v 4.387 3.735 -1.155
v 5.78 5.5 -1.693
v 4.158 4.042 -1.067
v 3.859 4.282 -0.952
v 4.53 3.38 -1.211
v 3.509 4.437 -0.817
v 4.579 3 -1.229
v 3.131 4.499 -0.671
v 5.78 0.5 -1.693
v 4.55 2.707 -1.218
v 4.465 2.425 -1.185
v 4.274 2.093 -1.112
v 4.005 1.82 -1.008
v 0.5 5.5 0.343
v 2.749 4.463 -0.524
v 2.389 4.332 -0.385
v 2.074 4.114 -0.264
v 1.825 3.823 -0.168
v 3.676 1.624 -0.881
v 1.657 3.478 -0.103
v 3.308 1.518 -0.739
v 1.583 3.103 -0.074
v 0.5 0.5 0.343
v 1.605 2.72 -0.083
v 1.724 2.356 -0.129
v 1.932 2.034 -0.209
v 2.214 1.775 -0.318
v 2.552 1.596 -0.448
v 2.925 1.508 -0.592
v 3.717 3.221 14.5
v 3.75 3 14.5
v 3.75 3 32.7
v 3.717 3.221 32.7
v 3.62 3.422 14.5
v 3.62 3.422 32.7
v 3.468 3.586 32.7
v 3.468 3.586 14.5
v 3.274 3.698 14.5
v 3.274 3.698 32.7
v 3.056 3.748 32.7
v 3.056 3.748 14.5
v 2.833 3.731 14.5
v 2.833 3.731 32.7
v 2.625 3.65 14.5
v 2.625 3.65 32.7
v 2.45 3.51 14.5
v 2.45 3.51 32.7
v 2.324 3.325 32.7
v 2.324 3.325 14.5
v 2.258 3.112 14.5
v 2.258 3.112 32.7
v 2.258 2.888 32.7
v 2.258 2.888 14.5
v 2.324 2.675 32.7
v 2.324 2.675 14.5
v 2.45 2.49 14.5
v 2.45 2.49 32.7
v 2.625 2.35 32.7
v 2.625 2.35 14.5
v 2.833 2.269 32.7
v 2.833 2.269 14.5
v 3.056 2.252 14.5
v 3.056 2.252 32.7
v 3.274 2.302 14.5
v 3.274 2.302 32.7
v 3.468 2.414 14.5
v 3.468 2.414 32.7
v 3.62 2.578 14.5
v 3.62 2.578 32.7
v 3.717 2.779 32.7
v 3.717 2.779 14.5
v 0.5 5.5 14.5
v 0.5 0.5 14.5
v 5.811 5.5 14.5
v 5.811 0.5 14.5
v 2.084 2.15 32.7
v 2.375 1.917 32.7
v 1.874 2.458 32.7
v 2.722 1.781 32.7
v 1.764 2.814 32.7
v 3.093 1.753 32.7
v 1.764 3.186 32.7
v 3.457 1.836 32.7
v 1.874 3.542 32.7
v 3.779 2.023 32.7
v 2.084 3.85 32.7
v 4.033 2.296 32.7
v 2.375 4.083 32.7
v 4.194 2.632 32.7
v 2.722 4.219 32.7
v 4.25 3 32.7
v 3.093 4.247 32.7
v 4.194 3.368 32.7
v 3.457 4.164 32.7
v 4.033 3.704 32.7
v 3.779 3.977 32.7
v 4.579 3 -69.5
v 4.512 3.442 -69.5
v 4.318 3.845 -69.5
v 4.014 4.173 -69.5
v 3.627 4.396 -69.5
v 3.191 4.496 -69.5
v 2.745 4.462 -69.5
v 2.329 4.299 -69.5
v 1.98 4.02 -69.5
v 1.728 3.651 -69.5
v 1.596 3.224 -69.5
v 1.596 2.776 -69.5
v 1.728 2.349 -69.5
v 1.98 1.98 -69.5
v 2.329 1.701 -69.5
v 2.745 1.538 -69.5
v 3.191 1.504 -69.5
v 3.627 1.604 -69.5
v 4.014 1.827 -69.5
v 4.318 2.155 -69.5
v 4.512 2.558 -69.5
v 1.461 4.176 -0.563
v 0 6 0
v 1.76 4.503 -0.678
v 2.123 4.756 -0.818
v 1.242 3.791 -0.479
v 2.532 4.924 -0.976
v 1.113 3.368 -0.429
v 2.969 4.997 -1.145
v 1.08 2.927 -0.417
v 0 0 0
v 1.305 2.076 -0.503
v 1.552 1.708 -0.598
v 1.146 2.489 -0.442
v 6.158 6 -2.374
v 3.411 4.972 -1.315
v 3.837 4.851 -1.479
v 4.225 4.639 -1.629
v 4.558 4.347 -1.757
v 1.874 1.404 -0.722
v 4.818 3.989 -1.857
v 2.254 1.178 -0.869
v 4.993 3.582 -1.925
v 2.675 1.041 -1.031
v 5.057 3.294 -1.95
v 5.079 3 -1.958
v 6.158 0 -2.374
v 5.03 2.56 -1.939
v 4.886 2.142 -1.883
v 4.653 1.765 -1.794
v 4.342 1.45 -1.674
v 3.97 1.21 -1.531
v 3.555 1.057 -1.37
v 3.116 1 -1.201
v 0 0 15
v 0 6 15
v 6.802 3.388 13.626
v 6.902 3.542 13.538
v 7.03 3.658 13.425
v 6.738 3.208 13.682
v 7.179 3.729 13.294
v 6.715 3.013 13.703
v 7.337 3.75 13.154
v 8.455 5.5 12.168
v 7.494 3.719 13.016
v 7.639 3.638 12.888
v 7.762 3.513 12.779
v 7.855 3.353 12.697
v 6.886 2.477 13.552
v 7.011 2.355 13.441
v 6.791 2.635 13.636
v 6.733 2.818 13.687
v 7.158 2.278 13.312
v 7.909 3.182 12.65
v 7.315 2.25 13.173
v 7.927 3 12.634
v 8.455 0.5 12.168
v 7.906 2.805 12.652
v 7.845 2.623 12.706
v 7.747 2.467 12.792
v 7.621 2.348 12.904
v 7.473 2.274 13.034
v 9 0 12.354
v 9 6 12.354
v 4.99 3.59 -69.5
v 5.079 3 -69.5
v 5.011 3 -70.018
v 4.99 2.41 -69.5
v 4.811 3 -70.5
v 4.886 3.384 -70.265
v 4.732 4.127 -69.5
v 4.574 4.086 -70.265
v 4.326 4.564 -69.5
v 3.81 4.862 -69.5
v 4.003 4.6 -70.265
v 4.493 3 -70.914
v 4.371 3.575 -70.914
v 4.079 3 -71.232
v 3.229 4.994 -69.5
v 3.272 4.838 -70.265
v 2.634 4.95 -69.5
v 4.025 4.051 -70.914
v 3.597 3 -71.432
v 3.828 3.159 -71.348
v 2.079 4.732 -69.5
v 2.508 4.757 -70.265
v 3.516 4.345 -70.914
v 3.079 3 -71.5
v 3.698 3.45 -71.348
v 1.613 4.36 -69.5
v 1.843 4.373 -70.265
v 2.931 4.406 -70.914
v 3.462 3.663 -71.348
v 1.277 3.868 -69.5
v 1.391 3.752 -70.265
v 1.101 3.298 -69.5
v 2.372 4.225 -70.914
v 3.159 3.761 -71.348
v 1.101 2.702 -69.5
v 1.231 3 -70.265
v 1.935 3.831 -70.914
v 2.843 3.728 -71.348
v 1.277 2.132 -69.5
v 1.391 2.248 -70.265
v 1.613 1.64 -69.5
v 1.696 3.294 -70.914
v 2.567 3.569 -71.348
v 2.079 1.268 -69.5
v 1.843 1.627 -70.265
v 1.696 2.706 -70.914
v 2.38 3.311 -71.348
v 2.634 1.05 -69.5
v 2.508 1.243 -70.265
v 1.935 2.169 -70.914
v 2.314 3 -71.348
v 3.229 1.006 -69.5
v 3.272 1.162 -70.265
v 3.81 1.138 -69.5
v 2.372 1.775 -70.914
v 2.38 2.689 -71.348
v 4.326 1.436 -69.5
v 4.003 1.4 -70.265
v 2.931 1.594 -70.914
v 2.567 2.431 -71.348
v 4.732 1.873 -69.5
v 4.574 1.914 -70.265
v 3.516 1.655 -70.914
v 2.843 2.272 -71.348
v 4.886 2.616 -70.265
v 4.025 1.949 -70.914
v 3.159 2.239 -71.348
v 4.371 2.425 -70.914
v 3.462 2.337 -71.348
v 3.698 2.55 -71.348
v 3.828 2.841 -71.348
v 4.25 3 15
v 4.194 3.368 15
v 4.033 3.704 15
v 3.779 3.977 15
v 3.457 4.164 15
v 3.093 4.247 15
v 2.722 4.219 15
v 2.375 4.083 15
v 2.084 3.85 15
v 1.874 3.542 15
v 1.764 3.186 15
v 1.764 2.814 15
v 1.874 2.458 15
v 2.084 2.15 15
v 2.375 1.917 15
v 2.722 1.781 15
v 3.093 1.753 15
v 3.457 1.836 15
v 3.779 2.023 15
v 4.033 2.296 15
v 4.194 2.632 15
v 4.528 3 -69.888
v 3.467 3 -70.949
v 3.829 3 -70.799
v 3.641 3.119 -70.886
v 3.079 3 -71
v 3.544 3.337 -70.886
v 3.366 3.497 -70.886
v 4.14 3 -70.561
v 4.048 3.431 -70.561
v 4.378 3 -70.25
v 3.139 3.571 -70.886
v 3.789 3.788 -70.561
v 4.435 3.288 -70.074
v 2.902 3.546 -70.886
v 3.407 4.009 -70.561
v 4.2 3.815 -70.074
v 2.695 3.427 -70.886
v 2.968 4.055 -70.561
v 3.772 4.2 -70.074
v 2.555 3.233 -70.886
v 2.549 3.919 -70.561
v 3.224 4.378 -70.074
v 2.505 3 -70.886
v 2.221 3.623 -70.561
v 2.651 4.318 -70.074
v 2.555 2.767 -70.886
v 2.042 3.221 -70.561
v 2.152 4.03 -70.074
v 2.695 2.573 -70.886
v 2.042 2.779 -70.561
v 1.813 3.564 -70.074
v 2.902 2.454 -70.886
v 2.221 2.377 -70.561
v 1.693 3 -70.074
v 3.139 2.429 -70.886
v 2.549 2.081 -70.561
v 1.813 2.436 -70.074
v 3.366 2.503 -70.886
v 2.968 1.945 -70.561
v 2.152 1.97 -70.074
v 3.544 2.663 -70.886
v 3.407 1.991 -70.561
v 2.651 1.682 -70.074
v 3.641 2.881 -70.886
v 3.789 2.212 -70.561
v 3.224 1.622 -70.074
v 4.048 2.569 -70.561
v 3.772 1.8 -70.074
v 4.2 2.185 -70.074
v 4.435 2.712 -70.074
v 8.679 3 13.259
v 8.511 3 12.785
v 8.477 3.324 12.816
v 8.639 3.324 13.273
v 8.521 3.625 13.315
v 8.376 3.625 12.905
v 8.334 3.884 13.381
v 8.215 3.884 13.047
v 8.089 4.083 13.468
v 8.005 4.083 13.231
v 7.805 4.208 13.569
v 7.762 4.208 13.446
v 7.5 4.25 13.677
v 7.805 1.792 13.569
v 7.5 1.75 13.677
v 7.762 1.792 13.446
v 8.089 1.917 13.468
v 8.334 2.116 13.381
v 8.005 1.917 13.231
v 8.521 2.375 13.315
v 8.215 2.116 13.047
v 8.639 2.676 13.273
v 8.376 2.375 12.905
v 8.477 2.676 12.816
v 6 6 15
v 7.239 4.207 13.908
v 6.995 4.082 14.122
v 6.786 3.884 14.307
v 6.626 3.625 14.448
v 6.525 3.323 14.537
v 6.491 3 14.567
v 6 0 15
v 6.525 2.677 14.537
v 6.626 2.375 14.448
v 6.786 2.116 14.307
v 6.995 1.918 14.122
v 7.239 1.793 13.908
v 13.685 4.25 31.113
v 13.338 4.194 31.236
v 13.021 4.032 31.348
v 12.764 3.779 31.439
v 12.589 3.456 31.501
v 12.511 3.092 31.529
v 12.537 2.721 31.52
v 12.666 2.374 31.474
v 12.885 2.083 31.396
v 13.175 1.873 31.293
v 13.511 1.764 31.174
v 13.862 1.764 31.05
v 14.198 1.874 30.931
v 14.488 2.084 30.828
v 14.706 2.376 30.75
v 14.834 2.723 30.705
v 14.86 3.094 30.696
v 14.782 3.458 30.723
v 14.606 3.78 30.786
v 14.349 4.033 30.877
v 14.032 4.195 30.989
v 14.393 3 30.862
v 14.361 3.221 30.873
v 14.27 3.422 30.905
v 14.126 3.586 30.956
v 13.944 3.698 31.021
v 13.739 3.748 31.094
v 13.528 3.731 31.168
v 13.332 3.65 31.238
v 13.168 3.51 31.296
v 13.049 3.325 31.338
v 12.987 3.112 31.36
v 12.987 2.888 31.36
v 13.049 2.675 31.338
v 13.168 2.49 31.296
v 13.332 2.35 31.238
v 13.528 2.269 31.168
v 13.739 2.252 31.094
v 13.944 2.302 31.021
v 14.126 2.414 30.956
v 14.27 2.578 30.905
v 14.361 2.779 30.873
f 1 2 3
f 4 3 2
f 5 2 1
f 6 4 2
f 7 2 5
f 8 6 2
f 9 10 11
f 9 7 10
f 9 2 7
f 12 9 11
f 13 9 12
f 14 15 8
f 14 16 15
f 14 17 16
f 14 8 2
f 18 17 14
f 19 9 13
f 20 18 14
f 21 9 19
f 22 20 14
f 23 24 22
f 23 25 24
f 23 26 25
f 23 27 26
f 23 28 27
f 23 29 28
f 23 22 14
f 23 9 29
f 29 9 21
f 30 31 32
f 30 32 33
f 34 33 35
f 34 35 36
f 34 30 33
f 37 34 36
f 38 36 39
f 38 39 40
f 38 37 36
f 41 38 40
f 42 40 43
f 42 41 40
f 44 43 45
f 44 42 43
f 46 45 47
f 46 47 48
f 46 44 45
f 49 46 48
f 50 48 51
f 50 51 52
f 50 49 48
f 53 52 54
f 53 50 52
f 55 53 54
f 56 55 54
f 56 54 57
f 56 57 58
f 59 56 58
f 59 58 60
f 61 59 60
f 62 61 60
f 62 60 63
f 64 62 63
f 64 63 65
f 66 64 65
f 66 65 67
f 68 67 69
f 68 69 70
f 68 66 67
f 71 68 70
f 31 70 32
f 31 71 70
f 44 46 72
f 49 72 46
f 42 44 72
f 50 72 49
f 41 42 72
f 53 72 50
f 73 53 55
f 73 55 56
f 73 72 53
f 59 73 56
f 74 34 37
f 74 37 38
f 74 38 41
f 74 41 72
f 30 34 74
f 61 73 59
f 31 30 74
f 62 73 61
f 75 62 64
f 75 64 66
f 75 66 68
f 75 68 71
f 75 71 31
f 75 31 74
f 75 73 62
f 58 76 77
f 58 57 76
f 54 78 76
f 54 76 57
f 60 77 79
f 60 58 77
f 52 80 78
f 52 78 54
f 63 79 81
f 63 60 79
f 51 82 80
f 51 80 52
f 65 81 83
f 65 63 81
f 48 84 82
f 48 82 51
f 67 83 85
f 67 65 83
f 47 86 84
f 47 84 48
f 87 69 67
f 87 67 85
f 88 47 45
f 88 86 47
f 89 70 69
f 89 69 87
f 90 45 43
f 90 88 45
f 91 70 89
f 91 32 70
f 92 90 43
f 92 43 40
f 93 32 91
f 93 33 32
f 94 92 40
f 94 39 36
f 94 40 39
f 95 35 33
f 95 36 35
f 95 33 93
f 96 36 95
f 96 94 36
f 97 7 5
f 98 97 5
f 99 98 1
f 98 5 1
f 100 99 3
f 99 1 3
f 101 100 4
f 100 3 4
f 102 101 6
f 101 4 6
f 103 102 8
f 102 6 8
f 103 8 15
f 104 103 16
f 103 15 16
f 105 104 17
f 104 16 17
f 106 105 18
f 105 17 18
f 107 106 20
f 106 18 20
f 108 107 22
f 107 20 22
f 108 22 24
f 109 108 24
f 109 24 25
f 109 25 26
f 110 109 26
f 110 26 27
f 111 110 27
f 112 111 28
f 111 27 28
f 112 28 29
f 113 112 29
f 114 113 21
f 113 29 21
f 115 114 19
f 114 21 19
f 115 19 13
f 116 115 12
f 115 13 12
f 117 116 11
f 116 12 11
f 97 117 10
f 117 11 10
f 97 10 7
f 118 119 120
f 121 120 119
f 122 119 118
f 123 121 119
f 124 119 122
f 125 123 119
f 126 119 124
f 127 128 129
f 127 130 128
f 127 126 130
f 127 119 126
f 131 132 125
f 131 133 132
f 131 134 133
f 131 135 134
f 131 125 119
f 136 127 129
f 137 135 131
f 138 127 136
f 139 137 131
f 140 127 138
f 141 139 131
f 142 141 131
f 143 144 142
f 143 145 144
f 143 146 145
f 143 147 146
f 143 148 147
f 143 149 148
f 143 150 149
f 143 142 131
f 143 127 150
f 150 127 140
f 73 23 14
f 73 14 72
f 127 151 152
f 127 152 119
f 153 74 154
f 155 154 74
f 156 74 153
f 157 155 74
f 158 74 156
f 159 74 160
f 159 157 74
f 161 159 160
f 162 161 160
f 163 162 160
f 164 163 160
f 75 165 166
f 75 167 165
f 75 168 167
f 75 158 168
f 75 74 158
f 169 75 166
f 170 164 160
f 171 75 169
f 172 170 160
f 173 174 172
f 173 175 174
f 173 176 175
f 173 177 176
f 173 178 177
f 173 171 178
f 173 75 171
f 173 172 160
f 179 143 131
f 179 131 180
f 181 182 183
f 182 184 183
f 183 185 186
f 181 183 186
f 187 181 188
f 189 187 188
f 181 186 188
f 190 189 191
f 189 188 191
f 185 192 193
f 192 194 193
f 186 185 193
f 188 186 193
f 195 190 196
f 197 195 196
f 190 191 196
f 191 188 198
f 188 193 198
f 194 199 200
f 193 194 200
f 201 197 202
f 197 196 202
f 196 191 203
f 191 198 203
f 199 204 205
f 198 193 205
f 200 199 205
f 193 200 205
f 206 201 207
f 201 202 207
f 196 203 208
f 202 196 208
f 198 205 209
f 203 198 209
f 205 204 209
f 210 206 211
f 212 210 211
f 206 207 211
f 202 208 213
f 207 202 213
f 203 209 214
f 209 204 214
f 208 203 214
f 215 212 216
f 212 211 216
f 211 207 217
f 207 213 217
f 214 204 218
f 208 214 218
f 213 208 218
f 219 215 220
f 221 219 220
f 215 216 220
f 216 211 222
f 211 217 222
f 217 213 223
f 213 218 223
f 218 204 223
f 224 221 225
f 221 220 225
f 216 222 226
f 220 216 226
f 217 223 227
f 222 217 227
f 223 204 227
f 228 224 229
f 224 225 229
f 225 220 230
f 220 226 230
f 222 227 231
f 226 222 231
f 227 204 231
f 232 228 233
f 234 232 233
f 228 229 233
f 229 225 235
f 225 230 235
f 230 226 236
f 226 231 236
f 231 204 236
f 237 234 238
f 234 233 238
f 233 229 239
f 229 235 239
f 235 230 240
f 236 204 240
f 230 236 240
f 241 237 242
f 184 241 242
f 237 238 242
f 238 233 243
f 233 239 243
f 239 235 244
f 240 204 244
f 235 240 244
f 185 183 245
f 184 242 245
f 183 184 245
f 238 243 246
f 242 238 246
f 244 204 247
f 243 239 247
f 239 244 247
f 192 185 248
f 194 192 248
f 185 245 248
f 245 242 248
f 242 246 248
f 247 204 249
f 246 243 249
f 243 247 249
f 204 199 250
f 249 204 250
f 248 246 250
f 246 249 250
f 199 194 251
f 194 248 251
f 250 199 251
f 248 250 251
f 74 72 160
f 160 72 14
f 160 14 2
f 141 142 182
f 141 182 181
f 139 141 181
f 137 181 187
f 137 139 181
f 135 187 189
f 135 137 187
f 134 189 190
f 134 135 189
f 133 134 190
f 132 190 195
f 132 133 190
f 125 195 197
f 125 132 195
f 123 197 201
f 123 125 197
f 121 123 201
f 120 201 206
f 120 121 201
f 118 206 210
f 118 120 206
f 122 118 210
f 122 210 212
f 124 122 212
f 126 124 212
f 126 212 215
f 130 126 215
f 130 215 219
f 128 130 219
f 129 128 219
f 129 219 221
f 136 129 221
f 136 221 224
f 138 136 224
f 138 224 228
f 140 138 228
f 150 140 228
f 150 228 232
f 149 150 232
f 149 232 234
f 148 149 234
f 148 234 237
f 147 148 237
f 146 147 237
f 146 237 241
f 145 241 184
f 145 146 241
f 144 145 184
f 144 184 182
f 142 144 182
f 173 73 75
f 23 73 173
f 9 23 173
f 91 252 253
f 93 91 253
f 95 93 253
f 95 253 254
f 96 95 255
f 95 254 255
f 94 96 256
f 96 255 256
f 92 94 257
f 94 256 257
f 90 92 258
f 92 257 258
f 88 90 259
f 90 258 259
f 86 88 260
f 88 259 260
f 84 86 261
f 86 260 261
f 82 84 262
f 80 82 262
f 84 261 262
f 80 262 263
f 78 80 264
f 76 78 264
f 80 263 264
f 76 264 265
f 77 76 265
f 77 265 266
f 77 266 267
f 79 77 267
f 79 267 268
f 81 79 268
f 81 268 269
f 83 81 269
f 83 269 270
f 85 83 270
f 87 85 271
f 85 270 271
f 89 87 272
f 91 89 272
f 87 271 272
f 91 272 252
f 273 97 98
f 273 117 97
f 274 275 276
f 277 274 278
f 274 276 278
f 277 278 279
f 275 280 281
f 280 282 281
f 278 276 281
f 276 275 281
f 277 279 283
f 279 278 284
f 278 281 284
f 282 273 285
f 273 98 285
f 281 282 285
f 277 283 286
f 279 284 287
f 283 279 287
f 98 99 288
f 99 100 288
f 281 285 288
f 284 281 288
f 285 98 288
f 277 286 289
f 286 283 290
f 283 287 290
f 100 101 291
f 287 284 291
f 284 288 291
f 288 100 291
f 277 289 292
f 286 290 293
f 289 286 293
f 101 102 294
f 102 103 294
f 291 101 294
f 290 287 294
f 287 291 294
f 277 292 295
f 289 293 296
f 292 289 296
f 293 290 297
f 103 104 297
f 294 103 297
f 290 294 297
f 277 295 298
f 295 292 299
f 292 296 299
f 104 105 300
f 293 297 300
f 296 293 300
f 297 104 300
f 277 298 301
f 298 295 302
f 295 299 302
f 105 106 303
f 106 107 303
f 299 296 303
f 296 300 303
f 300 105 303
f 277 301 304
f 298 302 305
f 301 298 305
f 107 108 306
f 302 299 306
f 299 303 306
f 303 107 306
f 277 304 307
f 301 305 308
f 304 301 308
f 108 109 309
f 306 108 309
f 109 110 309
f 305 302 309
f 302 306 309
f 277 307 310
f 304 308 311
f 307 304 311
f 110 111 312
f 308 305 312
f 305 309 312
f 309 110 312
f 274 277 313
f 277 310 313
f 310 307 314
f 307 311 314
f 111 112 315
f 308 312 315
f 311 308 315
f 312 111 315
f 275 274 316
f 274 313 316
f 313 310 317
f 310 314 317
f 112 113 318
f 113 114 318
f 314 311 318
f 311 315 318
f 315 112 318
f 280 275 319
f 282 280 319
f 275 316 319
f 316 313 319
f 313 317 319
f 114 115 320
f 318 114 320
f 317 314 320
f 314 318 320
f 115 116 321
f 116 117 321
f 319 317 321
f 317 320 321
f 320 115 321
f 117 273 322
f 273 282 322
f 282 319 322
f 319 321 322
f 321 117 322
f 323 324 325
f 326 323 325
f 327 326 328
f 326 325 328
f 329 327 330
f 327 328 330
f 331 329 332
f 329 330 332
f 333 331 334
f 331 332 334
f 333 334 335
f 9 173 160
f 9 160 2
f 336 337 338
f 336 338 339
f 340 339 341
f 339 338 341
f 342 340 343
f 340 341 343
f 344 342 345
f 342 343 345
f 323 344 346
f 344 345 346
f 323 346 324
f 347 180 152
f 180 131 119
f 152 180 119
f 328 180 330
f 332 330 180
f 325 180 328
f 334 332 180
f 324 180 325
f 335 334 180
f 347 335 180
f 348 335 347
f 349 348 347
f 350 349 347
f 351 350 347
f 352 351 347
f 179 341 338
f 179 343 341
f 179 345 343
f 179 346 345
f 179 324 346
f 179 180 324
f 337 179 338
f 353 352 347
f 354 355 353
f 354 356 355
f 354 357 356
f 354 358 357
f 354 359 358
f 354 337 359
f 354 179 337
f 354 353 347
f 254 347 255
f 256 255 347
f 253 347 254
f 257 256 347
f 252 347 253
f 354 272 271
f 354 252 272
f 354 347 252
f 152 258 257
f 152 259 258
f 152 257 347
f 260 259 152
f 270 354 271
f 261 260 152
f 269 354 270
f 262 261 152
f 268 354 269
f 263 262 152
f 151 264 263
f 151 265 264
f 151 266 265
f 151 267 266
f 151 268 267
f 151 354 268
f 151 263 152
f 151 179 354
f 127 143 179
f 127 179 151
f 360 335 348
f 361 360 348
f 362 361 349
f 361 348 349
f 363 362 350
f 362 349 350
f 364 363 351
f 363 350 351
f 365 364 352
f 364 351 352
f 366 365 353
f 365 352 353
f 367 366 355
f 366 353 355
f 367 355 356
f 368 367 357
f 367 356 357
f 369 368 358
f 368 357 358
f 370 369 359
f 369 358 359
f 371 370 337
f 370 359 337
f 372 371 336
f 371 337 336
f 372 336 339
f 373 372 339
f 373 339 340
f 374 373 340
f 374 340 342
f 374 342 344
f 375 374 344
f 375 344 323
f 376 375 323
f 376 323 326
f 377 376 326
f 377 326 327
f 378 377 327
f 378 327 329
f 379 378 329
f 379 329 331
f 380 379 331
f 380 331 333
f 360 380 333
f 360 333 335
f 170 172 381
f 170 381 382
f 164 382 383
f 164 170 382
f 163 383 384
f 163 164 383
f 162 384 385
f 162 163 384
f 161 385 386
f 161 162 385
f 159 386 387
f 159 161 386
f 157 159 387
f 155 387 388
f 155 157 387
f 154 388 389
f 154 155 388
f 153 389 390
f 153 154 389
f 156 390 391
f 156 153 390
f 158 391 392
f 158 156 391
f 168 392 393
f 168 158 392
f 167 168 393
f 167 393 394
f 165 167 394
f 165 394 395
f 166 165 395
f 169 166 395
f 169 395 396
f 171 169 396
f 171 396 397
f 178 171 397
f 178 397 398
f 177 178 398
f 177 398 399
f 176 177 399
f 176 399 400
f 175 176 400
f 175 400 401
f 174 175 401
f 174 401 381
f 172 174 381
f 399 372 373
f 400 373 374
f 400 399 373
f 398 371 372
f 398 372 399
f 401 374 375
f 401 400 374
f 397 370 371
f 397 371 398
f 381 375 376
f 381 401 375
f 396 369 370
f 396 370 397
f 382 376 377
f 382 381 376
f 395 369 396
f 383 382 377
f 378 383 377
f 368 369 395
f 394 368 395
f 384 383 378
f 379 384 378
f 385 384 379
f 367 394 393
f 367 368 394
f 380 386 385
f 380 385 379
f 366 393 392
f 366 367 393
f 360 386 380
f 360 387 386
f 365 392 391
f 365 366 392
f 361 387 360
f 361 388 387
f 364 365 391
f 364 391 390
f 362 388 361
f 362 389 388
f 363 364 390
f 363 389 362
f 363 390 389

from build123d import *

# Parameters (mm, degrees)
BOSS_EXTRUDE1_DEPTH = 6
SKETCH4_R           = 2
BOSS_EXTRUDE2_DEPTH = 71.5
FILLET1_R           = 2
SKETCH5_R           = 1.25
BOSS_EXTRUDE3_DEPTH = 17.7
SKETCH7_R           = 1.25
BOSS_EXTRUDE4_DEPTH = 18.5
BOSS_EXTRUDE5_START = -5
SKETCH7_2_R         = 1.25
BOSS_EXTRUDE5_DEPTH = 5
SHELL1_T            = -0.5


with BuildPart() as part:
    # Sketch1 → Boss-Extrude1 (new body)
    with BuildSketch(Plane(origin=(0, 0, 0), x_dir=(1, 0, 0), z_dir=(0, 1, 0))):
        Polygon((0, 0), (6.158217776, 2.374100634), (9, -12.354248689), (6, -15), (0, -15), align=None)
    extrude(amount=BOSS_EXTRUDE1_DEPTH)

    # Sketch4 → Boss-Extrude2 (add)
    with BuildSketch(Plane.XY):
        with Locations((3.079108888, 3)):
            Circle(SKETCH4_R)
    extrude(amount=-BOSS_EXTRUDE2_DEPTH)

    # Fillet1
    fillet1_edges = [part.edges().sort_by_distance(p)[0] for p in [
        (1.079108888, 3, -71.5),
    ]]
    fillet(fillet1_edges, radius=FILLET1_R)

    # Sketch5 → Boss-Extrude3 (add)
    with BuildSketch(Plane.XY.offset(15)):
        with Locations((3, 3)):
            Circle(SKETCH5_R)
    extrude(amount=BOSS_EXTRUDE3_DEPTH)

    # Sketch7 → Boss-Extrude4 (add)
    with BuildSketch(Plane(origin=(7.5, 6, 13.677124344), x_dir=(0.9424618522341062, 0, -0.33431371058252735), z_dir=(0.33431371058252735, 0, 0.9424618522341062))):
        with Locations((0.000948247, -3)):
            Circle(SKETCH7_R)
    extrude(amount=BOSS_EXTRUDE4_DEPTH)

    # Sketch7<2> → Boss-Extrude5 (add)
    with BuildSketch(Plane(origin=(7.5, 6, 13.677124344), x_dir=(0.9424618522341062, 0, -0.33431371058252735), z_dir=(0.33431371058252735, 0, 0.9424618522341062)).offset(BOSS_EXTRUDE5_START)):
        with Locations((0.000948247, -3)):
            Circle(SKETCH7_2_R)
    extrude(amount=BOSS_EXTRUDE5_DEPTH)

    # Shell1
    shell1_openings = [part.faces().sort_by_distance(p)[0] for p in [
        (3, 3, 32.7),
        (13.685697333, 3, 31.112351599),
    ]]
    offset(amount=SHELL1_T, openings=shell1_openings, kind=Kind.INTERSECTION)


solid = part.part
